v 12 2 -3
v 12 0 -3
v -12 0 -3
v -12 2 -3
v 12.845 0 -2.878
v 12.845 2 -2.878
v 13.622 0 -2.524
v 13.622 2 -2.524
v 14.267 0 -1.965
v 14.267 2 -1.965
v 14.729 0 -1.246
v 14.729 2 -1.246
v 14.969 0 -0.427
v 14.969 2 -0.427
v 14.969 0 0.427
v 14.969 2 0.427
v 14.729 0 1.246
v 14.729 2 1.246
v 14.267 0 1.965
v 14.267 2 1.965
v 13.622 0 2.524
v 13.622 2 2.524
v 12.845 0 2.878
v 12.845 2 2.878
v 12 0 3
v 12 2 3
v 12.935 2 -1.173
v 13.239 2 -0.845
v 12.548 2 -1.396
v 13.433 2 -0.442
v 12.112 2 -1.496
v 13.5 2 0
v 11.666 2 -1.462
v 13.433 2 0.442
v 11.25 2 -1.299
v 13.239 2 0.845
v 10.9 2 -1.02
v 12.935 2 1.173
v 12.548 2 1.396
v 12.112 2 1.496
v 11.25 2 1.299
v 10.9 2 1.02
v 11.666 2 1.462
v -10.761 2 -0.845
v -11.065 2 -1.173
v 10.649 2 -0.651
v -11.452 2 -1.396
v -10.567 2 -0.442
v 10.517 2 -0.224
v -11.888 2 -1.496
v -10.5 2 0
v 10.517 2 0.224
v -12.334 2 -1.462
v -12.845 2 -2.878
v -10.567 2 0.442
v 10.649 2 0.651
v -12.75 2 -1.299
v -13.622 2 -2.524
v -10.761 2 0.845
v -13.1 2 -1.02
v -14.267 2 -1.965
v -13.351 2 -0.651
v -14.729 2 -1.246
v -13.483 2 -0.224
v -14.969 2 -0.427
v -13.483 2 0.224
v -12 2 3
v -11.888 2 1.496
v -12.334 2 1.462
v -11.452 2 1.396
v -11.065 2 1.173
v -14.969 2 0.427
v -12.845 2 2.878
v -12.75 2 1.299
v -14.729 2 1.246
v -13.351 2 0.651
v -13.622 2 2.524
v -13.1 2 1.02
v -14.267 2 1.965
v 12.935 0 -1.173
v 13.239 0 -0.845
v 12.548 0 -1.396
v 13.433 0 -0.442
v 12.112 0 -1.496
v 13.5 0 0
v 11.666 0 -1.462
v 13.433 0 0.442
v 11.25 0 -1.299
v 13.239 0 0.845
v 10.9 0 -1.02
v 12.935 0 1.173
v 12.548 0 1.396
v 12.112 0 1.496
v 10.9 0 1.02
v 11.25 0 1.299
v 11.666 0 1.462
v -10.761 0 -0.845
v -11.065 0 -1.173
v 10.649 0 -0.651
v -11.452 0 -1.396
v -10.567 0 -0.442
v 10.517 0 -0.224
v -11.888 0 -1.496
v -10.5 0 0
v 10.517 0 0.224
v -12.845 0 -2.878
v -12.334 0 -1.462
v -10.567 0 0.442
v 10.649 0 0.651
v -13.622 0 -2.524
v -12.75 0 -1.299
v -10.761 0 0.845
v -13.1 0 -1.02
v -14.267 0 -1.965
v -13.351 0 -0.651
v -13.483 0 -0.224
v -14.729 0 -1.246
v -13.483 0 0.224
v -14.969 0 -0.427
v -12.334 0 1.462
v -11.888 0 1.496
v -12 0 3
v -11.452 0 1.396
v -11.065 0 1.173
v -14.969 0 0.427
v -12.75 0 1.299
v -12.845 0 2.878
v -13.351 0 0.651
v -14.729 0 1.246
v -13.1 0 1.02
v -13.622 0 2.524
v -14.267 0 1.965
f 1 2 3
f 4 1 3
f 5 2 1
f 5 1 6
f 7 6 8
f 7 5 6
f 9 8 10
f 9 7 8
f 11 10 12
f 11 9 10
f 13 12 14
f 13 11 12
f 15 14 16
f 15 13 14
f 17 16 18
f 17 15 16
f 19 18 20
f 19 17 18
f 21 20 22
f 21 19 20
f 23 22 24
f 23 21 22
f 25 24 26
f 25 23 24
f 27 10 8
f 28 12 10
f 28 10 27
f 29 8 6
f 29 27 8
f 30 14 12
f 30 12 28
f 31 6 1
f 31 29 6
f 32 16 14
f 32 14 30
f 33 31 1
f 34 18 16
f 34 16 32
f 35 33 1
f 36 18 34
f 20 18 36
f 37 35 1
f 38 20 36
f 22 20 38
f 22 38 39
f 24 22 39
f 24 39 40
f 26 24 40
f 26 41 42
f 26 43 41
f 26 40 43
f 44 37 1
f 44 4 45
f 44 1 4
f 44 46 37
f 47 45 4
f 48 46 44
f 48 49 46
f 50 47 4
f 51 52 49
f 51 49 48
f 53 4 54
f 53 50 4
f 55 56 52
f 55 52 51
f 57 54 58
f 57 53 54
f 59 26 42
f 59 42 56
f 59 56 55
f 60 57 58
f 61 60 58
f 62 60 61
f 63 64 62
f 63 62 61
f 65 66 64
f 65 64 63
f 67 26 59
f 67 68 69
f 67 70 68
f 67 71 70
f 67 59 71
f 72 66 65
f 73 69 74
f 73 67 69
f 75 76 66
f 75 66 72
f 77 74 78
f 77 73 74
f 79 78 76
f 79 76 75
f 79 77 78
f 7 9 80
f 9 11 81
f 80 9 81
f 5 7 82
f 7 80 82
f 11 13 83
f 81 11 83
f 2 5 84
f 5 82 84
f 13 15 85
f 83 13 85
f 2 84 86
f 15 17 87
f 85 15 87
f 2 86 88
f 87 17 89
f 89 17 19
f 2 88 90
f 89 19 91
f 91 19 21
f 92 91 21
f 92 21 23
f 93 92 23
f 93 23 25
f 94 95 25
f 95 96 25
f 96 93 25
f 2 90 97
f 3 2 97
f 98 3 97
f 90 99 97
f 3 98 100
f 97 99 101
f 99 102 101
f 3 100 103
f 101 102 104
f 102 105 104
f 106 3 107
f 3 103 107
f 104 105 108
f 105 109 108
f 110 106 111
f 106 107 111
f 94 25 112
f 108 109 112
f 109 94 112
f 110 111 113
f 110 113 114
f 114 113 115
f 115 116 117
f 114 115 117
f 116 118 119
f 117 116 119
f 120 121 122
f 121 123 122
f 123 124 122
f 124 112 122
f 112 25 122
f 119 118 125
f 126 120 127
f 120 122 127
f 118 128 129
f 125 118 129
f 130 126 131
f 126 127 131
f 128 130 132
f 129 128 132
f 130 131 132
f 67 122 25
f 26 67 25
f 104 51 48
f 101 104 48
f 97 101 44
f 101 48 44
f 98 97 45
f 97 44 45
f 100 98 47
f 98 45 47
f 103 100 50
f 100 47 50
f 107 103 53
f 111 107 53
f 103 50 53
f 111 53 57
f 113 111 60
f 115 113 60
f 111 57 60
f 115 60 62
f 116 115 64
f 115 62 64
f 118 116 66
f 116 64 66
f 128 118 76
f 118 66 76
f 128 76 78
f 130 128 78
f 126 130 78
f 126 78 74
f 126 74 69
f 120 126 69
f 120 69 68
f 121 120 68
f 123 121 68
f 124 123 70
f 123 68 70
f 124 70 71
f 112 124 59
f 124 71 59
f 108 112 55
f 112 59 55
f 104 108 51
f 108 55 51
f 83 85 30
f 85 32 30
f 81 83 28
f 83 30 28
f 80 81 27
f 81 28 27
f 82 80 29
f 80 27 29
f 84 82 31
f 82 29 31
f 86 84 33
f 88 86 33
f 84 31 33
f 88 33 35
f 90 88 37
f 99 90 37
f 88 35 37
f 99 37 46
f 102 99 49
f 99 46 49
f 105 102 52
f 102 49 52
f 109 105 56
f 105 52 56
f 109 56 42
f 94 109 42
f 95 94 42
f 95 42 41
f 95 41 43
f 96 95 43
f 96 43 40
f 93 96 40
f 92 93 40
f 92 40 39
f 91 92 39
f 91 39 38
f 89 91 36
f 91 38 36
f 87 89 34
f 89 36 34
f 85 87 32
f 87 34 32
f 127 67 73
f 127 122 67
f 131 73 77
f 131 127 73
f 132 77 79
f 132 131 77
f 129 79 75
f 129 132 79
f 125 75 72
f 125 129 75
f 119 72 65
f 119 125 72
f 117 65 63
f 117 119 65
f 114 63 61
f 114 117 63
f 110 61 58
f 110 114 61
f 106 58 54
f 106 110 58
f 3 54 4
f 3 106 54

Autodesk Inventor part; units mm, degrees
ref_plane "YZ Plane" through (0, 0, 0) normal (1, 0, 0) x (0, 1, 0)
ref_plane "XZ Plane" through (0, 0, 0) normal (0, 1, 0) x (-1, 0, 0)
ref_plane "XY Plane" through (0, 0, 0) normal (0, 0, 1) x (1, 0, 0)
sketch "Sketch1" plane through (0, 0, 0) normal (0, 1, 0) x (-1, 0, 0)
  line L0 (-12, -3) -> (12, -3)
  line L1 (12, -3) -> (12, 3)
  line L2 (12, 3) -> (-12, 3)
  line L3 (-12, 3) -> (-12, -3)
  line L4 (-12, -3) -> (12, 3) construction
  line L5 (12, -3) -> (-12, 3) construction
  circle A0 centre (12, 0) radius 3
  circle A1 centre (-12, 0) radius 3
  point P0 (0, 0)
  dimension "d0" = 24
  dimension "d1" = 6
  dimension "d2" = 6
  dimension "d3" = 6
extrude "Extrusion1" add sketch "Sketch1" along normal blind 2
sketch "Sketch2" plane through (0, 2, 0) normal (0, 1, 0) x (1, 0, 0)
  arc A0 (12, -3) -> (12, 3) centre (12, 0) ccw projected
  arc A1 (-12, 3) -> (-12, -3) centre (-12, 0) ccw projected
  circle A2 centre (-12, 0) radius 1
  circle A3 centre (12, 0) radius 1.5
  circle A4 centre (-12, 0) radius 1.5
  point P0 (0, 0)
  dimension "d6" = 2
  dimension "d7" = 3
  dimension "d8" = 3
extrude "Extrusion2" cut sketch "Sketch2" against normal blind 2 contours A2 | A3 | A4
properties part number "tahlo5"
